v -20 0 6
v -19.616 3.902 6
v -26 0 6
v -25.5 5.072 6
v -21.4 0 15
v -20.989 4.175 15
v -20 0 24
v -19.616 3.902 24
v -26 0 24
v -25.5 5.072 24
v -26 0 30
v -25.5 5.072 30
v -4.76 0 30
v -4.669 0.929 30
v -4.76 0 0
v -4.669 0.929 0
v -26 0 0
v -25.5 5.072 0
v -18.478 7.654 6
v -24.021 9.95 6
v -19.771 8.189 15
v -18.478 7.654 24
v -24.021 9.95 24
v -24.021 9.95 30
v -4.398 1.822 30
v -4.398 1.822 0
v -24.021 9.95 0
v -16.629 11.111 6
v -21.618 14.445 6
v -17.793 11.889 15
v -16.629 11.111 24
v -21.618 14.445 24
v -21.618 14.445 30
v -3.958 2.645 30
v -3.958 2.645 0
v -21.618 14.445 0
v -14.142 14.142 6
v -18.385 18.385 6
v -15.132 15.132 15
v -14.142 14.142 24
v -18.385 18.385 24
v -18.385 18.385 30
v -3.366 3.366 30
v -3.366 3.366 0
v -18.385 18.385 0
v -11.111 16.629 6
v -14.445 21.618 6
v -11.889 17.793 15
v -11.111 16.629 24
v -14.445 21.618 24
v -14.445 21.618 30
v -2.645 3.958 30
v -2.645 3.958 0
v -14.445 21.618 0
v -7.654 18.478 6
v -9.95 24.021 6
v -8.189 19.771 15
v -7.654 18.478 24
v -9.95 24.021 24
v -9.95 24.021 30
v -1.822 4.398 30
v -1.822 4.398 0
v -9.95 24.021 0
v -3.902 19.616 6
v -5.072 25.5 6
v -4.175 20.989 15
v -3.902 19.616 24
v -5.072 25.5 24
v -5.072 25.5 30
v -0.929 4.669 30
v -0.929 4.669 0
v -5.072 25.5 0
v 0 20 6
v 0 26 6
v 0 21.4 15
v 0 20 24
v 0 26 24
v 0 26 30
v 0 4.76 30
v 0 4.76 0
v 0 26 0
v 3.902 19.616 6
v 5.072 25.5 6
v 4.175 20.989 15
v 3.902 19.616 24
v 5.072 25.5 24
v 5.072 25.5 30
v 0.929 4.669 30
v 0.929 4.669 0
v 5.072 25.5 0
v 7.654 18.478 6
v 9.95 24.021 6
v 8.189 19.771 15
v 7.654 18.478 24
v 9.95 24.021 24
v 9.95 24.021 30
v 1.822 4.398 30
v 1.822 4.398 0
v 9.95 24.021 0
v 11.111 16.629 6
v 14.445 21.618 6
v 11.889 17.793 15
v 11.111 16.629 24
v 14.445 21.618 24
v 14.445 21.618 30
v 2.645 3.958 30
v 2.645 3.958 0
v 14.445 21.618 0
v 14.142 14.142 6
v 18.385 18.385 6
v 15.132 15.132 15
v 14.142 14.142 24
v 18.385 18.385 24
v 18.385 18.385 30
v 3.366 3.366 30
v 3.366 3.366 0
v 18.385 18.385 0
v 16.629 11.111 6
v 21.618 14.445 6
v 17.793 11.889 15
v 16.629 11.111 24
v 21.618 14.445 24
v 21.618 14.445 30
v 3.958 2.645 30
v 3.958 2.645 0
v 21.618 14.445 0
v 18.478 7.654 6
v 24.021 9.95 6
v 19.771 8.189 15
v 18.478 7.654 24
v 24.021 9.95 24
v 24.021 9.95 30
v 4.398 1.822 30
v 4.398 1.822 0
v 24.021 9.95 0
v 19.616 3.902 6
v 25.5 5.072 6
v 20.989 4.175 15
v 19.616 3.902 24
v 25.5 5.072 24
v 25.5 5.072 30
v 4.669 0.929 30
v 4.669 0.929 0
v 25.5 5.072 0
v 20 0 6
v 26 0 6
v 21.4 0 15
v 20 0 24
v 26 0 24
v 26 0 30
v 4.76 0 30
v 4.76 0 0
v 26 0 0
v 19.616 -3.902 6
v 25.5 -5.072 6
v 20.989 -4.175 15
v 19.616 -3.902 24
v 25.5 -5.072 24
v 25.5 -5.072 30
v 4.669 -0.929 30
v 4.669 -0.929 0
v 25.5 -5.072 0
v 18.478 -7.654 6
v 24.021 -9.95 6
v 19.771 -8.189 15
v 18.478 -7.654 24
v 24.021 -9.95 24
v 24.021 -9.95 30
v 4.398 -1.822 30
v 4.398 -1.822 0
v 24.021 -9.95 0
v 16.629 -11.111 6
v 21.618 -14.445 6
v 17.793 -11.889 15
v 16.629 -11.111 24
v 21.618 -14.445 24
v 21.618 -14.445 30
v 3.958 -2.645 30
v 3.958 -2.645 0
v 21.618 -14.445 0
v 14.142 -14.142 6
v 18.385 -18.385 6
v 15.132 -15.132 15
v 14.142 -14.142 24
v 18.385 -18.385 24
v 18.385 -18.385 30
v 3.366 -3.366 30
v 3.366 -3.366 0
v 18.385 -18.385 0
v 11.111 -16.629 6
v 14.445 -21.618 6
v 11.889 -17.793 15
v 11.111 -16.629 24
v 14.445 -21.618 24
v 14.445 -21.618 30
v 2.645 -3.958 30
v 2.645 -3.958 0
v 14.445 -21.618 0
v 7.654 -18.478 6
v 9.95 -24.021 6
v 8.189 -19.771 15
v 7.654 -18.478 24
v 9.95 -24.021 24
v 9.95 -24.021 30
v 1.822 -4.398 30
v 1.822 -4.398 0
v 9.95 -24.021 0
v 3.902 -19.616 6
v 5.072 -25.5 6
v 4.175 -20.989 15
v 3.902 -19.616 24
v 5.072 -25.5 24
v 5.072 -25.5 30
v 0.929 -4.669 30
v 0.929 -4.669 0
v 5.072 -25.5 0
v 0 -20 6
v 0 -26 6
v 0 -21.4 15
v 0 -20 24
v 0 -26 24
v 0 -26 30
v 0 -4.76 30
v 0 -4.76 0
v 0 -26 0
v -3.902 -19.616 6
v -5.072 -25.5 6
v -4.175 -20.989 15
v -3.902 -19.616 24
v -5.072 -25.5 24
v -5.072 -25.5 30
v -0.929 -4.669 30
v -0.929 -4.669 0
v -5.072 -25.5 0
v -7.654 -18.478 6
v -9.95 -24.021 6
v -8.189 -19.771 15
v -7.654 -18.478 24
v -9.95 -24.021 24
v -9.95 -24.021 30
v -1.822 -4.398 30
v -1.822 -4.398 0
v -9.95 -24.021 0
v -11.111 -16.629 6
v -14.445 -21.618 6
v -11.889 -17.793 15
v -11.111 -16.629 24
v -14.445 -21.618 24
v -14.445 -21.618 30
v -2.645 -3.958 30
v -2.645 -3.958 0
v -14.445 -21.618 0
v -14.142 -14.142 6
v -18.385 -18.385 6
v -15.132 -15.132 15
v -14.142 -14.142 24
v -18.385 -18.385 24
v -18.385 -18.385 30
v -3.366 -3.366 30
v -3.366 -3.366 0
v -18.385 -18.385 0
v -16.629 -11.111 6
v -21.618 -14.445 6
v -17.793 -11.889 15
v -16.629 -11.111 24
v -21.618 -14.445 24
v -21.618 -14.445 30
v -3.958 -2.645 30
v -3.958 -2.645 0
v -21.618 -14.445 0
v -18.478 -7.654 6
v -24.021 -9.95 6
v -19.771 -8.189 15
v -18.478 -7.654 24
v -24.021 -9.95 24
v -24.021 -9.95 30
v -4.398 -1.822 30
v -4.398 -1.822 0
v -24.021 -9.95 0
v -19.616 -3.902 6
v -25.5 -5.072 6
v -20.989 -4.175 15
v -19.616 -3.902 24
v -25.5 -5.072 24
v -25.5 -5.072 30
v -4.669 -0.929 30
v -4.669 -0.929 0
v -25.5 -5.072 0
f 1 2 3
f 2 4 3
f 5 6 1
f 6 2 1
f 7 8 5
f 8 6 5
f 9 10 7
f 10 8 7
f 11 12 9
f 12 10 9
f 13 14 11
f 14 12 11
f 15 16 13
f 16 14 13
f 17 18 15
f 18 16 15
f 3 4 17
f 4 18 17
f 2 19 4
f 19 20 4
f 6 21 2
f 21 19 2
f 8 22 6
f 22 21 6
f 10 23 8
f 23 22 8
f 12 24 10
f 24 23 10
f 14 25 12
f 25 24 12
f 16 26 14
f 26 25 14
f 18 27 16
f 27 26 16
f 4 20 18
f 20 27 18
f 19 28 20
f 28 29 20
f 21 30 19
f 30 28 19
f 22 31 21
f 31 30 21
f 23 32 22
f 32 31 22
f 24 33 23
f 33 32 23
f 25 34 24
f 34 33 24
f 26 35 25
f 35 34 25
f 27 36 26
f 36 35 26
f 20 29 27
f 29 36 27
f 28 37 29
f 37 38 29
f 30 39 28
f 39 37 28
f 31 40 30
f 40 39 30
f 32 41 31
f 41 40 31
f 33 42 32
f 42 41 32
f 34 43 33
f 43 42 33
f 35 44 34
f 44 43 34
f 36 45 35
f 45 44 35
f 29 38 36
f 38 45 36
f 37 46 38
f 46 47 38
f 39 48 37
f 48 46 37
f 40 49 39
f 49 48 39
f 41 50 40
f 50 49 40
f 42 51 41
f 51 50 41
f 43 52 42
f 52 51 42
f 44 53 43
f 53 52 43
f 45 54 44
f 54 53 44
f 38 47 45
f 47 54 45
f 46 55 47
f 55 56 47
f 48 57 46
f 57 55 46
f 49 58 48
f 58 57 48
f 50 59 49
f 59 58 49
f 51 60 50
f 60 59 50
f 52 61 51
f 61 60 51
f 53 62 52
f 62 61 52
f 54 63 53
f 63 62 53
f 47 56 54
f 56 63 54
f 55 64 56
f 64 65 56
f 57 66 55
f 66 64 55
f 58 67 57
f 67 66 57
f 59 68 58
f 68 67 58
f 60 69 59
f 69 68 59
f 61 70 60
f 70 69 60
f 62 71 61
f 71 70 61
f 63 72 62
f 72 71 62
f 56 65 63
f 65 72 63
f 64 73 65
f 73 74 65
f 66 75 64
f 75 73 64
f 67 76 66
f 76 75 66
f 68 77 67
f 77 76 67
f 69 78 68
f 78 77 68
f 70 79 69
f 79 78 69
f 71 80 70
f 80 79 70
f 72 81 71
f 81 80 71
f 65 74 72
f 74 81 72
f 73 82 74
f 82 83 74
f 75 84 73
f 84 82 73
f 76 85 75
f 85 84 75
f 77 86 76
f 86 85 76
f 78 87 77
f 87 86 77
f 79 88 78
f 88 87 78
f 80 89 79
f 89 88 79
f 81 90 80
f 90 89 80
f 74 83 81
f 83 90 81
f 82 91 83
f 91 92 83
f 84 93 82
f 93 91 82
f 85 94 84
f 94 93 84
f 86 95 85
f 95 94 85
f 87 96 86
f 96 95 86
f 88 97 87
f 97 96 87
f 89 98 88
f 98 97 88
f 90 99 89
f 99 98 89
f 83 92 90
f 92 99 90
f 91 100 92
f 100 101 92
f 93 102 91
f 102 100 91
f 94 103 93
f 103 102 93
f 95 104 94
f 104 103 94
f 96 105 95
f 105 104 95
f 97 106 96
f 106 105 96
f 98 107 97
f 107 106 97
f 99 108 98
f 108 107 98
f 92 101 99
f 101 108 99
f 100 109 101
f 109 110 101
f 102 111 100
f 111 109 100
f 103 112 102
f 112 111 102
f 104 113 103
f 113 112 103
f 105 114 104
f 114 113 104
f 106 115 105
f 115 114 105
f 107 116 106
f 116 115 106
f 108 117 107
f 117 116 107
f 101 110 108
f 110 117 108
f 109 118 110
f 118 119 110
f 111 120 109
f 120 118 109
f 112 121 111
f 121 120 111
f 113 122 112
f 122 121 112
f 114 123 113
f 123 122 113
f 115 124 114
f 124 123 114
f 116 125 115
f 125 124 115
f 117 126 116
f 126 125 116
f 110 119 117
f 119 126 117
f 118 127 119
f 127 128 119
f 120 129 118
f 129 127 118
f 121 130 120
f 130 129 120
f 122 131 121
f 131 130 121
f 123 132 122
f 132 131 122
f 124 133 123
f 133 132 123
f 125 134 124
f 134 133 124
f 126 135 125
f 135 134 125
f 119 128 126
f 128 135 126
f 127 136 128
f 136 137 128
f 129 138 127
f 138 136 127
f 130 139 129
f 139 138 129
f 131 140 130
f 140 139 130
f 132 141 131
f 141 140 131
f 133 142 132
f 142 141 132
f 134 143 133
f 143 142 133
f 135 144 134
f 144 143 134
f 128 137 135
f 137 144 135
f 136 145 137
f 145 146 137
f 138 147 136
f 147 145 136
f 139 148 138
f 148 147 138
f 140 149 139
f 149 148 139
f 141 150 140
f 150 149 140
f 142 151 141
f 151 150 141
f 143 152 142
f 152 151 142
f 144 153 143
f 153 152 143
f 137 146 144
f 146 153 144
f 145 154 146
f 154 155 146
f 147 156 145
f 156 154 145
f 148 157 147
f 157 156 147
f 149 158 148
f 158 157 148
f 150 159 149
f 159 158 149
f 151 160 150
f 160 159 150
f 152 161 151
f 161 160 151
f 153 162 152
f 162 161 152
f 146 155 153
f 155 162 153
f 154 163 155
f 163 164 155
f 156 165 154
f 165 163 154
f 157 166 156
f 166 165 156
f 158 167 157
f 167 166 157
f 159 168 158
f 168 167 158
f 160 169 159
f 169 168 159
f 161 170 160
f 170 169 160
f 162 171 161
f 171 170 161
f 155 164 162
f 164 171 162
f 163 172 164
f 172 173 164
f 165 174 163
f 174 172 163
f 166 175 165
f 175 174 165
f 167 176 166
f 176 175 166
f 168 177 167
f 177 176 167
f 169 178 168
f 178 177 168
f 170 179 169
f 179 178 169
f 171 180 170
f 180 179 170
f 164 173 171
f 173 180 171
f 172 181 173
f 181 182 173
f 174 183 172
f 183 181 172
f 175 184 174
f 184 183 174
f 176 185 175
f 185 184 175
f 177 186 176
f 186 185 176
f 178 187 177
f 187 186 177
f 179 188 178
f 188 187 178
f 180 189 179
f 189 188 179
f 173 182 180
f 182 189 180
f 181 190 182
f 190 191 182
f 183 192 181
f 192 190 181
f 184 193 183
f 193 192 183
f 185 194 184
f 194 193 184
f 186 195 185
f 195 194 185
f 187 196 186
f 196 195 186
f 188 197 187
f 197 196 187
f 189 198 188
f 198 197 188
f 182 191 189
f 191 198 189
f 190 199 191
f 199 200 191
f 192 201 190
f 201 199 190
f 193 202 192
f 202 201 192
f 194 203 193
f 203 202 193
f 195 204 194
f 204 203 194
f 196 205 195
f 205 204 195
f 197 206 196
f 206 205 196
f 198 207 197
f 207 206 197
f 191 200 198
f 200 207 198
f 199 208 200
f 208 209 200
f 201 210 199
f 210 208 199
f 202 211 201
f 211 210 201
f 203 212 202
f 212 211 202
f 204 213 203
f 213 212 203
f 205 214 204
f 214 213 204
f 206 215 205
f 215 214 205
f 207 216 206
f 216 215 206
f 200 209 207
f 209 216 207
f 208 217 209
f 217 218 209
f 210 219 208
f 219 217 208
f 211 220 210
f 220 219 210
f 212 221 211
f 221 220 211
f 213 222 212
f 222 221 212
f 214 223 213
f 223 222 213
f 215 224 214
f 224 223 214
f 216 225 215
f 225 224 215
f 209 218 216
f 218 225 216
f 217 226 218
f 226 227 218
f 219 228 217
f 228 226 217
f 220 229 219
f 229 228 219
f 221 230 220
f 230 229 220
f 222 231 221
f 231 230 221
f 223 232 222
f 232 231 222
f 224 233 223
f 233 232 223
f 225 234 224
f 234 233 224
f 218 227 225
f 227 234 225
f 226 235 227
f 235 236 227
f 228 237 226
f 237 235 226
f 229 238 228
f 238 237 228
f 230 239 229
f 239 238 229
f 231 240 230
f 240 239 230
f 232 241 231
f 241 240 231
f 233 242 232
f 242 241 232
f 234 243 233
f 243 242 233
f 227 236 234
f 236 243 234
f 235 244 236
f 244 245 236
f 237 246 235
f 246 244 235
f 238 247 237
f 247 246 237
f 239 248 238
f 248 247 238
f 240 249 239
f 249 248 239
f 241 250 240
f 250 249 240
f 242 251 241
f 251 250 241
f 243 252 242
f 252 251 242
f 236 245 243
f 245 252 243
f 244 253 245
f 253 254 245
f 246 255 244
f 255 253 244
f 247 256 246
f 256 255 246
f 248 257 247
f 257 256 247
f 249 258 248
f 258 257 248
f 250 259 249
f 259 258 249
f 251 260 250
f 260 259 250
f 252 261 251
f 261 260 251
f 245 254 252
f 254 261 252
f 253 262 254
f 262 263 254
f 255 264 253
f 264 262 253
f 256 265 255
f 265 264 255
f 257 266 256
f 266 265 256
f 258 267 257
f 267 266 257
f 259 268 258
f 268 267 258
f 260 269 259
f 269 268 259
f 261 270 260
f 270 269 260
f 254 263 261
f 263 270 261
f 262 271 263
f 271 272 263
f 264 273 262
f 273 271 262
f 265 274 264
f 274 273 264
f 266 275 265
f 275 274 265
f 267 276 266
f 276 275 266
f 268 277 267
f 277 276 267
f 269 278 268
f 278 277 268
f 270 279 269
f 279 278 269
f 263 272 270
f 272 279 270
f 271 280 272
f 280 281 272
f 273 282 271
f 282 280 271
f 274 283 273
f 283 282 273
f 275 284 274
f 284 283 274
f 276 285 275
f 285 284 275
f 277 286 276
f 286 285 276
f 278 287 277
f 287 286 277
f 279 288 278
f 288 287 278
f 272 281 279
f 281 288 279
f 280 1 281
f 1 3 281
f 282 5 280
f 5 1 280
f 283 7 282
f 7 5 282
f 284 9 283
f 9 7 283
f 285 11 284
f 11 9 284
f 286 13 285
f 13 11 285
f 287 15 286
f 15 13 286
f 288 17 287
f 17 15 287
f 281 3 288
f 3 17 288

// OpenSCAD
$fn = 32;

// ----------------------------------------------------------------------
// Belt roller: 40 mm barrel, 30 mm wide, bore 9.52 mm
// ----------------------------------------------------------------------

// --- parameters (mm) ---
bore_d = 9.52;            // bore
barrel_d = 40;            // barrel diameter
roller_w = 30;            // roller width
flange_d = 52;            // flange diameter
flange_t = 6;             // flange thickness
hub_d = 29.52;            // hub diameter

roller_profile = [[4.76, 0], [26, 0], [26, 6], [20, 6], [21.4, 15], [20, 24], [26, 24], [26, 30], [4.76, 30]];

/* the profile stays clear of the axis, so the bore comes out of the revolve */
rotate_extrude() polygon(roller_profile);
